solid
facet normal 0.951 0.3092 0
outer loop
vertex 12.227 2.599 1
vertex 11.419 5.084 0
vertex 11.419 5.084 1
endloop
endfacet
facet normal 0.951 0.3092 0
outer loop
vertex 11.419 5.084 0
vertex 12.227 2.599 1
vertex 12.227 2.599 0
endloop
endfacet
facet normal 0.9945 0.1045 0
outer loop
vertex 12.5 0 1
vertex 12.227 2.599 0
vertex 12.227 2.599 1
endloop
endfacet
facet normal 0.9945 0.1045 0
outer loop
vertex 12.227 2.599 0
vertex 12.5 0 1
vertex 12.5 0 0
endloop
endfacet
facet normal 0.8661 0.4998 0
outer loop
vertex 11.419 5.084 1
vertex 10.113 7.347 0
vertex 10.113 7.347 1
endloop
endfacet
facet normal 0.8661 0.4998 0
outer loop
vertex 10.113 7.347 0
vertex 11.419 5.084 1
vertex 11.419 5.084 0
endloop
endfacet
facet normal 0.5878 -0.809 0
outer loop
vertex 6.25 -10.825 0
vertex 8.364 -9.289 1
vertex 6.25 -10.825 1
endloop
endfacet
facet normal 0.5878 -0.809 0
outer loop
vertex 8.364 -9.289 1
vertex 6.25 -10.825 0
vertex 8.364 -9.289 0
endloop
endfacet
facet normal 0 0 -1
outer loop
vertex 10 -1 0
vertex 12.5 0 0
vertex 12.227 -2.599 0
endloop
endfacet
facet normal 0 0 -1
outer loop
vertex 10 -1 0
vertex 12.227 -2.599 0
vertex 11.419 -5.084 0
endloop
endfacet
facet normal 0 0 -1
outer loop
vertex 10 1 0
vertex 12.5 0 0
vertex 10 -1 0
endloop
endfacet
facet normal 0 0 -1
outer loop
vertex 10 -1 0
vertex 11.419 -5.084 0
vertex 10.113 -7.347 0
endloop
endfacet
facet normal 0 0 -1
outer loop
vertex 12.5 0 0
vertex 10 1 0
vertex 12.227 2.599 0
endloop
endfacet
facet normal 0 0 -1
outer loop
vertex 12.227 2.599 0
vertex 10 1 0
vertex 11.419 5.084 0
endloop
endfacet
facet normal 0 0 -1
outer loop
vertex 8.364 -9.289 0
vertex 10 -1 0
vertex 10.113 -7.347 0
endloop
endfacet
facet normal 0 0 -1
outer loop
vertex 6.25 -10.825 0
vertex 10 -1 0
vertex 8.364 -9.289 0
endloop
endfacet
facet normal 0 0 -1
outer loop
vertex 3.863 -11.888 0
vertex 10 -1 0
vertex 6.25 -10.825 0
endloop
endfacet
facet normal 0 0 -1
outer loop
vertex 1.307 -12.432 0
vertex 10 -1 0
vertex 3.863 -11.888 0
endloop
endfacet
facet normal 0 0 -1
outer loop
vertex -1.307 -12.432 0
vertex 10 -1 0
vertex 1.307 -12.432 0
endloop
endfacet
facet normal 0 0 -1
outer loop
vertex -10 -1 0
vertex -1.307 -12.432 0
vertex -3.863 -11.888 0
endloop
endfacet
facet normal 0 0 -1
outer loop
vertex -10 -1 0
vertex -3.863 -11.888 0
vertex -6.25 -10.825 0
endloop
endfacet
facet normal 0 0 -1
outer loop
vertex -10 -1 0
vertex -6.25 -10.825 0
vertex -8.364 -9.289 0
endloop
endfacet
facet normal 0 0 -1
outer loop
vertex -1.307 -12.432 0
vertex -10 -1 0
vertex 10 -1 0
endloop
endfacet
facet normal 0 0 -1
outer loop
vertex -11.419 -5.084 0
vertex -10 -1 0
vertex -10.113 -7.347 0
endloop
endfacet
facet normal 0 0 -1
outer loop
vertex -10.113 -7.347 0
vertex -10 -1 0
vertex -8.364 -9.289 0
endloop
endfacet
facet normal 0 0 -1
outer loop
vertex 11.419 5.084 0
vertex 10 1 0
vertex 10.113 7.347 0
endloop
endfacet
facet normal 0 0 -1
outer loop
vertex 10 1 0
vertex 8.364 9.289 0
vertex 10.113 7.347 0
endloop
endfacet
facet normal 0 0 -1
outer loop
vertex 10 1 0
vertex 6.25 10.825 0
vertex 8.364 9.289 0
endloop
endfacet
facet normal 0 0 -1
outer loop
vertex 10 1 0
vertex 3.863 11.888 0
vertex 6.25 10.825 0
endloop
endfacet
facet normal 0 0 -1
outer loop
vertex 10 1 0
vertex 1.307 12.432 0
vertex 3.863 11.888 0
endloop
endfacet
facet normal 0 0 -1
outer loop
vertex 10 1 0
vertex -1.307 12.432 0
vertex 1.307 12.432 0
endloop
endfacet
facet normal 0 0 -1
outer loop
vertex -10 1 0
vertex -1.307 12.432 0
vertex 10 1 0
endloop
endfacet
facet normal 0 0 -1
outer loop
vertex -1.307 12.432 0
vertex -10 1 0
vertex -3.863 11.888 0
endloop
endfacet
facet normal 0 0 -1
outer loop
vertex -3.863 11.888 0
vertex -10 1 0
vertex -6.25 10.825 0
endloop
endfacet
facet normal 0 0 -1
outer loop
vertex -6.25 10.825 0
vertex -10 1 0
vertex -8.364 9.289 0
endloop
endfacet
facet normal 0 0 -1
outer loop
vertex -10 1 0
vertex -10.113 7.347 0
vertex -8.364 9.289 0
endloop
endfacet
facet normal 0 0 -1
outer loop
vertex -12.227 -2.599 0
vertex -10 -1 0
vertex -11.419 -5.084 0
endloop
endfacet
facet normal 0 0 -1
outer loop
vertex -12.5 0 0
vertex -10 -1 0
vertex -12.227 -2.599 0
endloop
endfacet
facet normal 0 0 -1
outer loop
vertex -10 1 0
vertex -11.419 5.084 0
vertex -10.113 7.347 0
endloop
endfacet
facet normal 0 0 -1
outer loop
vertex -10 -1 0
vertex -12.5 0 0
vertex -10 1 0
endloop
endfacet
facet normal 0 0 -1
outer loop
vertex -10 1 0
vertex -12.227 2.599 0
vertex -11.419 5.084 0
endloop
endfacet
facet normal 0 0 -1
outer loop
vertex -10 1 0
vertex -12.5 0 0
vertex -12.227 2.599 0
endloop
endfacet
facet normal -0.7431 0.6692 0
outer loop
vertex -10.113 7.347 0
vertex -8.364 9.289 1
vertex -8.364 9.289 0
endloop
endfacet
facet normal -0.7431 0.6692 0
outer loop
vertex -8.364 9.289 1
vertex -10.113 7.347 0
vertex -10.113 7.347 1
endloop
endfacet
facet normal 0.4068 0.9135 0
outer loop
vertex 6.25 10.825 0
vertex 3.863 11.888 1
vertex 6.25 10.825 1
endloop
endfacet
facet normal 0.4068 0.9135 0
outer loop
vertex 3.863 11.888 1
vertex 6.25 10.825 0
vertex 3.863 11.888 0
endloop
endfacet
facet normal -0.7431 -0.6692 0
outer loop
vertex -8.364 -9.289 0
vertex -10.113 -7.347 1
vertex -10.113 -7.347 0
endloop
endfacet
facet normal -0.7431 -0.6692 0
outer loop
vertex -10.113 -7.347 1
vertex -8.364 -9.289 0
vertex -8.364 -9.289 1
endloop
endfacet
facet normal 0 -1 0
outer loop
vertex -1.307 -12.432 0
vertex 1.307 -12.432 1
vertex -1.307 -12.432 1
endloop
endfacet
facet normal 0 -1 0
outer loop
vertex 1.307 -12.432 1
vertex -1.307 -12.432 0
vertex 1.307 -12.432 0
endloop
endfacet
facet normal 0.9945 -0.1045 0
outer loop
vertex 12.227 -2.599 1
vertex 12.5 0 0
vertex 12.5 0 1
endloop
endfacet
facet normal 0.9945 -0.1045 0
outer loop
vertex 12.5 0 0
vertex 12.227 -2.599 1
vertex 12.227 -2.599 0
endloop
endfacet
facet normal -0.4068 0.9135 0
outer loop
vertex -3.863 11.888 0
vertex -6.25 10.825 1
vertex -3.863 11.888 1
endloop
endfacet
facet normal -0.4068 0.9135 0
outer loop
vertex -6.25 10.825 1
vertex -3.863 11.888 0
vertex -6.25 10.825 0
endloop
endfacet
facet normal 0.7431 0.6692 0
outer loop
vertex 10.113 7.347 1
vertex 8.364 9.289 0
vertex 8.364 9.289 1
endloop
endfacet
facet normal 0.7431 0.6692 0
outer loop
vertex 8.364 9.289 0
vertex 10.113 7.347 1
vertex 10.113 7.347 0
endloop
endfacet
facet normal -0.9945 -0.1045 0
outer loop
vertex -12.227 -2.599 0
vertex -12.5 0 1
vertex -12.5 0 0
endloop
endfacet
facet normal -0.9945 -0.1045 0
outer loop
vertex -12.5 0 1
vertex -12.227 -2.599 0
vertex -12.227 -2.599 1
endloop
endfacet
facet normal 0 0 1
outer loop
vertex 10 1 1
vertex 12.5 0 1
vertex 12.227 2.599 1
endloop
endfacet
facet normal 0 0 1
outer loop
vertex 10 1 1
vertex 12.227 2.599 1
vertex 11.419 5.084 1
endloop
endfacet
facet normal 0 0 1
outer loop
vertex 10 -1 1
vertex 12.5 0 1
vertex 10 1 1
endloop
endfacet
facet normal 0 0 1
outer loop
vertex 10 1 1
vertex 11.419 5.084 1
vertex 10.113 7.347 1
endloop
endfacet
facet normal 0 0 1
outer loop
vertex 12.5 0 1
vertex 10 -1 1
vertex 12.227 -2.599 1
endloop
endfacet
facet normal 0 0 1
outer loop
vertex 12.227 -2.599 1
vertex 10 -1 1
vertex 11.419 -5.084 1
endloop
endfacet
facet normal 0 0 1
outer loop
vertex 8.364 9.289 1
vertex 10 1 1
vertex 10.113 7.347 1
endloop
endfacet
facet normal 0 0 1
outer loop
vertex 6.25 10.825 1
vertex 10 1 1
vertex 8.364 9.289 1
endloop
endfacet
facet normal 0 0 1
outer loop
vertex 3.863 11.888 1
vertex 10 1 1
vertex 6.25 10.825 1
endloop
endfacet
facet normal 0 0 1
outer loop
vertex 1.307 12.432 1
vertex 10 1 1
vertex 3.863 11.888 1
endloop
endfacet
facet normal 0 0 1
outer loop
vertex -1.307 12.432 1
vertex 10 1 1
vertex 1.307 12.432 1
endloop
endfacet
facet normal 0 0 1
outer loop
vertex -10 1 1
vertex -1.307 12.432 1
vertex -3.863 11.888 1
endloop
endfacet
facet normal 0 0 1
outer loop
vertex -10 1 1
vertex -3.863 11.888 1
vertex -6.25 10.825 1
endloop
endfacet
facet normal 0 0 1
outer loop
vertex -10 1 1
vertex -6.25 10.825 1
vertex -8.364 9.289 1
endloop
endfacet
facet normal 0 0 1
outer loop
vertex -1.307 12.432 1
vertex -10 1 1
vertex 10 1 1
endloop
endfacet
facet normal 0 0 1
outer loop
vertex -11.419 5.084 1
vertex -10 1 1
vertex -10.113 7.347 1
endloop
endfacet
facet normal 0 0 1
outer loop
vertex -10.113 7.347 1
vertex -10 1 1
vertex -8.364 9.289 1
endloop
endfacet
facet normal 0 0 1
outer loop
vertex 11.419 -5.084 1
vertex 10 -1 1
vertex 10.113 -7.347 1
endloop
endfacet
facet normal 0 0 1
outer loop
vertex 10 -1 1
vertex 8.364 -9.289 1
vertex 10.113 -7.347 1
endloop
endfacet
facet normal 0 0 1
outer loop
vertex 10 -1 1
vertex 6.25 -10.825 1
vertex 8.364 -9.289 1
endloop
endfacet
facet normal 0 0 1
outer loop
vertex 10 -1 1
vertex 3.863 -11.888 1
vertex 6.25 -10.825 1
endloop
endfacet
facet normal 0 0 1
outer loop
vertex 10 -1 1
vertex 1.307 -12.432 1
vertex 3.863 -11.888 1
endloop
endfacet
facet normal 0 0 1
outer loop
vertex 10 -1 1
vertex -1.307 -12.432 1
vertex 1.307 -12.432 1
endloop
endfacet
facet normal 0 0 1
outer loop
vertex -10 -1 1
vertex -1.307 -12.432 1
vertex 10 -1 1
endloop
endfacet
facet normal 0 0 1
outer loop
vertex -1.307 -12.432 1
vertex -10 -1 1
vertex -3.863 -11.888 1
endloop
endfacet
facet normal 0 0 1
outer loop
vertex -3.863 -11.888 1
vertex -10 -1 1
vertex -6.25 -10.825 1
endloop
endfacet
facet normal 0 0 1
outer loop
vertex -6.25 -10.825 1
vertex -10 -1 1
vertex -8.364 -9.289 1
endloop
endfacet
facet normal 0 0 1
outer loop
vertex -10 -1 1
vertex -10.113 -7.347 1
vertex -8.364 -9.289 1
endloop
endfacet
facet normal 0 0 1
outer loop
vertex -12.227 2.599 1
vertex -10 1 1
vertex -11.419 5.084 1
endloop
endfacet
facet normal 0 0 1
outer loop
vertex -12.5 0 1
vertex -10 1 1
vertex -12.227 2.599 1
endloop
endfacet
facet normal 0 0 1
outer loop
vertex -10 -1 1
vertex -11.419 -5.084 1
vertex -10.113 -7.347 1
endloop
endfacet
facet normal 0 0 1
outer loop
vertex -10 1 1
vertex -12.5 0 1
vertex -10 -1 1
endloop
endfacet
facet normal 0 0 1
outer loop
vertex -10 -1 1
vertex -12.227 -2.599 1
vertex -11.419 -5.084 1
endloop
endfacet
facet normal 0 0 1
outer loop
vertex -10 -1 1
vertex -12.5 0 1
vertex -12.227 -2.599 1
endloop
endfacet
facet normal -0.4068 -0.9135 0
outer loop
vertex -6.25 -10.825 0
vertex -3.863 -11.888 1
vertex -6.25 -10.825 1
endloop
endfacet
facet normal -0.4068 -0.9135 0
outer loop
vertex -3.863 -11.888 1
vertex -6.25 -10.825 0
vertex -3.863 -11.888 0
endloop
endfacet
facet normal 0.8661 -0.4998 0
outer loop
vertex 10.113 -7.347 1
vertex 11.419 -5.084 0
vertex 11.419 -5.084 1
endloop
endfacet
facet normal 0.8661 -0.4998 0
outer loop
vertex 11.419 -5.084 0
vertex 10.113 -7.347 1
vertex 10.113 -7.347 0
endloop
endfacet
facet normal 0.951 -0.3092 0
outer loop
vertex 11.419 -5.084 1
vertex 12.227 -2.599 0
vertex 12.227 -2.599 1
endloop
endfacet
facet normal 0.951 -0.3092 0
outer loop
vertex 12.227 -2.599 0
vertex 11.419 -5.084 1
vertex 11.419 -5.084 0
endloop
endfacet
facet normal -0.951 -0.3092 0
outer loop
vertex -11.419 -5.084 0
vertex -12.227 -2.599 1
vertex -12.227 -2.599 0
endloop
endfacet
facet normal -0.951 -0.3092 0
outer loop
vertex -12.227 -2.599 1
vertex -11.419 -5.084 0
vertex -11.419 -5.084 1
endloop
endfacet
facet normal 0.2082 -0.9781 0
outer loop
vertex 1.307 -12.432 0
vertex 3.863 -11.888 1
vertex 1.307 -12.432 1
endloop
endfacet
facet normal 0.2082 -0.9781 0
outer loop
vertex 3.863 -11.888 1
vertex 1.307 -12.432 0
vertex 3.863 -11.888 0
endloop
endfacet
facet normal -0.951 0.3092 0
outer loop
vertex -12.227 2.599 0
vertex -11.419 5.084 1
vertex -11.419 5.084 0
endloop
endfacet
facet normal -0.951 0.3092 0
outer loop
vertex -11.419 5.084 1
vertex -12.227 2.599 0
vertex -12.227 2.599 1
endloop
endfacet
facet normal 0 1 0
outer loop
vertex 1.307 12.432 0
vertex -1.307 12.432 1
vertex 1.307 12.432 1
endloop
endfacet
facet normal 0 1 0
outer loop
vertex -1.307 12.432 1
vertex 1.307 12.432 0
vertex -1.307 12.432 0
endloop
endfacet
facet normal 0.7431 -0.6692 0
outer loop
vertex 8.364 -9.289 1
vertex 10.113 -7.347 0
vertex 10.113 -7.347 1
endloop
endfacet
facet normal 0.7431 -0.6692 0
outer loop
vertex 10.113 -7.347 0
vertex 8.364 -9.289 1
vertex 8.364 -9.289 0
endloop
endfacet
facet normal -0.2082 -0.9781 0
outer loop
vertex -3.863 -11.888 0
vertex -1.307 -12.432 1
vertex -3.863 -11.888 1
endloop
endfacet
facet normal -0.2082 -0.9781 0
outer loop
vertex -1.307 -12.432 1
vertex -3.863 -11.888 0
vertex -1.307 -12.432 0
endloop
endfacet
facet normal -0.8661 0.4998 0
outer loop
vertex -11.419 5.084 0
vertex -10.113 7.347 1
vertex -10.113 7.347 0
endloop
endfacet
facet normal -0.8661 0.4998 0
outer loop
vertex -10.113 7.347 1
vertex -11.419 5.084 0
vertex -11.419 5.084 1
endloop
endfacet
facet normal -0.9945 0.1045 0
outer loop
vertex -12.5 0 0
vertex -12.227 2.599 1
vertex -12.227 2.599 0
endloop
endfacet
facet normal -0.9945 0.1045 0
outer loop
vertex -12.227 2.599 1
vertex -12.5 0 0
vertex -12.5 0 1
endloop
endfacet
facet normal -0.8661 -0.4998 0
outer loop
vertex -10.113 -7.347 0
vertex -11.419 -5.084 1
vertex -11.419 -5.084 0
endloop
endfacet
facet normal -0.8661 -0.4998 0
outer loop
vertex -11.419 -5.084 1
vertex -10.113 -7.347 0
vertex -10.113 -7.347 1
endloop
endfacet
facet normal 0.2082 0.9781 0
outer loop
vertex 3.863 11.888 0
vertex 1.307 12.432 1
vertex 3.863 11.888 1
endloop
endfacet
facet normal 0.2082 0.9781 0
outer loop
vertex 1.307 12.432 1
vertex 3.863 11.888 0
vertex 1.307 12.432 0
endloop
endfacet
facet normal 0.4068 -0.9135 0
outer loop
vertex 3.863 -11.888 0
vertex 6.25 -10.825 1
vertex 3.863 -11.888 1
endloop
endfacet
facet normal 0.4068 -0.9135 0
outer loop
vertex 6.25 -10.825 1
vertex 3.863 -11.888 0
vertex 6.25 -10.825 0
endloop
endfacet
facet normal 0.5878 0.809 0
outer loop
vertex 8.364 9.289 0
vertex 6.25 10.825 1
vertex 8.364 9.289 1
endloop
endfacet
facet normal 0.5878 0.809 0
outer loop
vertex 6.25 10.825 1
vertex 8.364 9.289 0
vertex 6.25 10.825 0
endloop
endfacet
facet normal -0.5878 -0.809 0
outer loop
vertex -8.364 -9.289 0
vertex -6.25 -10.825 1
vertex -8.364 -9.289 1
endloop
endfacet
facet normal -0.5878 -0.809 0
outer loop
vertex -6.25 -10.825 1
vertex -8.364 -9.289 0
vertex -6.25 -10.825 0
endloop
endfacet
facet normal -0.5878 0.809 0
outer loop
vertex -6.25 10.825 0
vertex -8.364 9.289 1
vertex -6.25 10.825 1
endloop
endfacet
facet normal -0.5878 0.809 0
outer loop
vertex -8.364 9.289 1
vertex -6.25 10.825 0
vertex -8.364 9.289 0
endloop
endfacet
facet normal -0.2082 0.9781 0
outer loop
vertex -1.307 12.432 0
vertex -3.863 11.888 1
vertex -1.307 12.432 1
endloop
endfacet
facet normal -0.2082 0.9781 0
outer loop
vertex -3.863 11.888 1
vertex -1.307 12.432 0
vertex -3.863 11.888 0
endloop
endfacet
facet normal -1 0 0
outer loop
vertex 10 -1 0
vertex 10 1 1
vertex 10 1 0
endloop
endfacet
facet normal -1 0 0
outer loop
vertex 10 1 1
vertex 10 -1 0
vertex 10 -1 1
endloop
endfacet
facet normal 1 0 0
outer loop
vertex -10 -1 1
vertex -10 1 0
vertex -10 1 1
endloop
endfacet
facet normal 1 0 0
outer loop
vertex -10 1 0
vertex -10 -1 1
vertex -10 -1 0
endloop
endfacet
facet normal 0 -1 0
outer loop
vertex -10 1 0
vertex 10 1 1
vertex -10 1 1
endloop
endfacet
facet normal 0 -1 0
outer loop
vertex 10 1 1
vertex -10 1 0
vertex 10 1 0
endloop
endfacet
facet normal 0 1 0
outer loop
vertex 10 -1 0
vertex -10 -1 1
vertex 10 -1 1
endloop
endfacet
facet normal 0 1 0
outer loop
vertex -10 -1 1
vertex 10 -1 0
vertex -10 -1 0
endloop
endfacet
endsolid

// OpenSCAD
longueurTrou=20;
epaisseurTrou=2;
difference(){
cylinder(d=25);
cube([longueurTrou,epaisseurTrou,10],center=true);
}
